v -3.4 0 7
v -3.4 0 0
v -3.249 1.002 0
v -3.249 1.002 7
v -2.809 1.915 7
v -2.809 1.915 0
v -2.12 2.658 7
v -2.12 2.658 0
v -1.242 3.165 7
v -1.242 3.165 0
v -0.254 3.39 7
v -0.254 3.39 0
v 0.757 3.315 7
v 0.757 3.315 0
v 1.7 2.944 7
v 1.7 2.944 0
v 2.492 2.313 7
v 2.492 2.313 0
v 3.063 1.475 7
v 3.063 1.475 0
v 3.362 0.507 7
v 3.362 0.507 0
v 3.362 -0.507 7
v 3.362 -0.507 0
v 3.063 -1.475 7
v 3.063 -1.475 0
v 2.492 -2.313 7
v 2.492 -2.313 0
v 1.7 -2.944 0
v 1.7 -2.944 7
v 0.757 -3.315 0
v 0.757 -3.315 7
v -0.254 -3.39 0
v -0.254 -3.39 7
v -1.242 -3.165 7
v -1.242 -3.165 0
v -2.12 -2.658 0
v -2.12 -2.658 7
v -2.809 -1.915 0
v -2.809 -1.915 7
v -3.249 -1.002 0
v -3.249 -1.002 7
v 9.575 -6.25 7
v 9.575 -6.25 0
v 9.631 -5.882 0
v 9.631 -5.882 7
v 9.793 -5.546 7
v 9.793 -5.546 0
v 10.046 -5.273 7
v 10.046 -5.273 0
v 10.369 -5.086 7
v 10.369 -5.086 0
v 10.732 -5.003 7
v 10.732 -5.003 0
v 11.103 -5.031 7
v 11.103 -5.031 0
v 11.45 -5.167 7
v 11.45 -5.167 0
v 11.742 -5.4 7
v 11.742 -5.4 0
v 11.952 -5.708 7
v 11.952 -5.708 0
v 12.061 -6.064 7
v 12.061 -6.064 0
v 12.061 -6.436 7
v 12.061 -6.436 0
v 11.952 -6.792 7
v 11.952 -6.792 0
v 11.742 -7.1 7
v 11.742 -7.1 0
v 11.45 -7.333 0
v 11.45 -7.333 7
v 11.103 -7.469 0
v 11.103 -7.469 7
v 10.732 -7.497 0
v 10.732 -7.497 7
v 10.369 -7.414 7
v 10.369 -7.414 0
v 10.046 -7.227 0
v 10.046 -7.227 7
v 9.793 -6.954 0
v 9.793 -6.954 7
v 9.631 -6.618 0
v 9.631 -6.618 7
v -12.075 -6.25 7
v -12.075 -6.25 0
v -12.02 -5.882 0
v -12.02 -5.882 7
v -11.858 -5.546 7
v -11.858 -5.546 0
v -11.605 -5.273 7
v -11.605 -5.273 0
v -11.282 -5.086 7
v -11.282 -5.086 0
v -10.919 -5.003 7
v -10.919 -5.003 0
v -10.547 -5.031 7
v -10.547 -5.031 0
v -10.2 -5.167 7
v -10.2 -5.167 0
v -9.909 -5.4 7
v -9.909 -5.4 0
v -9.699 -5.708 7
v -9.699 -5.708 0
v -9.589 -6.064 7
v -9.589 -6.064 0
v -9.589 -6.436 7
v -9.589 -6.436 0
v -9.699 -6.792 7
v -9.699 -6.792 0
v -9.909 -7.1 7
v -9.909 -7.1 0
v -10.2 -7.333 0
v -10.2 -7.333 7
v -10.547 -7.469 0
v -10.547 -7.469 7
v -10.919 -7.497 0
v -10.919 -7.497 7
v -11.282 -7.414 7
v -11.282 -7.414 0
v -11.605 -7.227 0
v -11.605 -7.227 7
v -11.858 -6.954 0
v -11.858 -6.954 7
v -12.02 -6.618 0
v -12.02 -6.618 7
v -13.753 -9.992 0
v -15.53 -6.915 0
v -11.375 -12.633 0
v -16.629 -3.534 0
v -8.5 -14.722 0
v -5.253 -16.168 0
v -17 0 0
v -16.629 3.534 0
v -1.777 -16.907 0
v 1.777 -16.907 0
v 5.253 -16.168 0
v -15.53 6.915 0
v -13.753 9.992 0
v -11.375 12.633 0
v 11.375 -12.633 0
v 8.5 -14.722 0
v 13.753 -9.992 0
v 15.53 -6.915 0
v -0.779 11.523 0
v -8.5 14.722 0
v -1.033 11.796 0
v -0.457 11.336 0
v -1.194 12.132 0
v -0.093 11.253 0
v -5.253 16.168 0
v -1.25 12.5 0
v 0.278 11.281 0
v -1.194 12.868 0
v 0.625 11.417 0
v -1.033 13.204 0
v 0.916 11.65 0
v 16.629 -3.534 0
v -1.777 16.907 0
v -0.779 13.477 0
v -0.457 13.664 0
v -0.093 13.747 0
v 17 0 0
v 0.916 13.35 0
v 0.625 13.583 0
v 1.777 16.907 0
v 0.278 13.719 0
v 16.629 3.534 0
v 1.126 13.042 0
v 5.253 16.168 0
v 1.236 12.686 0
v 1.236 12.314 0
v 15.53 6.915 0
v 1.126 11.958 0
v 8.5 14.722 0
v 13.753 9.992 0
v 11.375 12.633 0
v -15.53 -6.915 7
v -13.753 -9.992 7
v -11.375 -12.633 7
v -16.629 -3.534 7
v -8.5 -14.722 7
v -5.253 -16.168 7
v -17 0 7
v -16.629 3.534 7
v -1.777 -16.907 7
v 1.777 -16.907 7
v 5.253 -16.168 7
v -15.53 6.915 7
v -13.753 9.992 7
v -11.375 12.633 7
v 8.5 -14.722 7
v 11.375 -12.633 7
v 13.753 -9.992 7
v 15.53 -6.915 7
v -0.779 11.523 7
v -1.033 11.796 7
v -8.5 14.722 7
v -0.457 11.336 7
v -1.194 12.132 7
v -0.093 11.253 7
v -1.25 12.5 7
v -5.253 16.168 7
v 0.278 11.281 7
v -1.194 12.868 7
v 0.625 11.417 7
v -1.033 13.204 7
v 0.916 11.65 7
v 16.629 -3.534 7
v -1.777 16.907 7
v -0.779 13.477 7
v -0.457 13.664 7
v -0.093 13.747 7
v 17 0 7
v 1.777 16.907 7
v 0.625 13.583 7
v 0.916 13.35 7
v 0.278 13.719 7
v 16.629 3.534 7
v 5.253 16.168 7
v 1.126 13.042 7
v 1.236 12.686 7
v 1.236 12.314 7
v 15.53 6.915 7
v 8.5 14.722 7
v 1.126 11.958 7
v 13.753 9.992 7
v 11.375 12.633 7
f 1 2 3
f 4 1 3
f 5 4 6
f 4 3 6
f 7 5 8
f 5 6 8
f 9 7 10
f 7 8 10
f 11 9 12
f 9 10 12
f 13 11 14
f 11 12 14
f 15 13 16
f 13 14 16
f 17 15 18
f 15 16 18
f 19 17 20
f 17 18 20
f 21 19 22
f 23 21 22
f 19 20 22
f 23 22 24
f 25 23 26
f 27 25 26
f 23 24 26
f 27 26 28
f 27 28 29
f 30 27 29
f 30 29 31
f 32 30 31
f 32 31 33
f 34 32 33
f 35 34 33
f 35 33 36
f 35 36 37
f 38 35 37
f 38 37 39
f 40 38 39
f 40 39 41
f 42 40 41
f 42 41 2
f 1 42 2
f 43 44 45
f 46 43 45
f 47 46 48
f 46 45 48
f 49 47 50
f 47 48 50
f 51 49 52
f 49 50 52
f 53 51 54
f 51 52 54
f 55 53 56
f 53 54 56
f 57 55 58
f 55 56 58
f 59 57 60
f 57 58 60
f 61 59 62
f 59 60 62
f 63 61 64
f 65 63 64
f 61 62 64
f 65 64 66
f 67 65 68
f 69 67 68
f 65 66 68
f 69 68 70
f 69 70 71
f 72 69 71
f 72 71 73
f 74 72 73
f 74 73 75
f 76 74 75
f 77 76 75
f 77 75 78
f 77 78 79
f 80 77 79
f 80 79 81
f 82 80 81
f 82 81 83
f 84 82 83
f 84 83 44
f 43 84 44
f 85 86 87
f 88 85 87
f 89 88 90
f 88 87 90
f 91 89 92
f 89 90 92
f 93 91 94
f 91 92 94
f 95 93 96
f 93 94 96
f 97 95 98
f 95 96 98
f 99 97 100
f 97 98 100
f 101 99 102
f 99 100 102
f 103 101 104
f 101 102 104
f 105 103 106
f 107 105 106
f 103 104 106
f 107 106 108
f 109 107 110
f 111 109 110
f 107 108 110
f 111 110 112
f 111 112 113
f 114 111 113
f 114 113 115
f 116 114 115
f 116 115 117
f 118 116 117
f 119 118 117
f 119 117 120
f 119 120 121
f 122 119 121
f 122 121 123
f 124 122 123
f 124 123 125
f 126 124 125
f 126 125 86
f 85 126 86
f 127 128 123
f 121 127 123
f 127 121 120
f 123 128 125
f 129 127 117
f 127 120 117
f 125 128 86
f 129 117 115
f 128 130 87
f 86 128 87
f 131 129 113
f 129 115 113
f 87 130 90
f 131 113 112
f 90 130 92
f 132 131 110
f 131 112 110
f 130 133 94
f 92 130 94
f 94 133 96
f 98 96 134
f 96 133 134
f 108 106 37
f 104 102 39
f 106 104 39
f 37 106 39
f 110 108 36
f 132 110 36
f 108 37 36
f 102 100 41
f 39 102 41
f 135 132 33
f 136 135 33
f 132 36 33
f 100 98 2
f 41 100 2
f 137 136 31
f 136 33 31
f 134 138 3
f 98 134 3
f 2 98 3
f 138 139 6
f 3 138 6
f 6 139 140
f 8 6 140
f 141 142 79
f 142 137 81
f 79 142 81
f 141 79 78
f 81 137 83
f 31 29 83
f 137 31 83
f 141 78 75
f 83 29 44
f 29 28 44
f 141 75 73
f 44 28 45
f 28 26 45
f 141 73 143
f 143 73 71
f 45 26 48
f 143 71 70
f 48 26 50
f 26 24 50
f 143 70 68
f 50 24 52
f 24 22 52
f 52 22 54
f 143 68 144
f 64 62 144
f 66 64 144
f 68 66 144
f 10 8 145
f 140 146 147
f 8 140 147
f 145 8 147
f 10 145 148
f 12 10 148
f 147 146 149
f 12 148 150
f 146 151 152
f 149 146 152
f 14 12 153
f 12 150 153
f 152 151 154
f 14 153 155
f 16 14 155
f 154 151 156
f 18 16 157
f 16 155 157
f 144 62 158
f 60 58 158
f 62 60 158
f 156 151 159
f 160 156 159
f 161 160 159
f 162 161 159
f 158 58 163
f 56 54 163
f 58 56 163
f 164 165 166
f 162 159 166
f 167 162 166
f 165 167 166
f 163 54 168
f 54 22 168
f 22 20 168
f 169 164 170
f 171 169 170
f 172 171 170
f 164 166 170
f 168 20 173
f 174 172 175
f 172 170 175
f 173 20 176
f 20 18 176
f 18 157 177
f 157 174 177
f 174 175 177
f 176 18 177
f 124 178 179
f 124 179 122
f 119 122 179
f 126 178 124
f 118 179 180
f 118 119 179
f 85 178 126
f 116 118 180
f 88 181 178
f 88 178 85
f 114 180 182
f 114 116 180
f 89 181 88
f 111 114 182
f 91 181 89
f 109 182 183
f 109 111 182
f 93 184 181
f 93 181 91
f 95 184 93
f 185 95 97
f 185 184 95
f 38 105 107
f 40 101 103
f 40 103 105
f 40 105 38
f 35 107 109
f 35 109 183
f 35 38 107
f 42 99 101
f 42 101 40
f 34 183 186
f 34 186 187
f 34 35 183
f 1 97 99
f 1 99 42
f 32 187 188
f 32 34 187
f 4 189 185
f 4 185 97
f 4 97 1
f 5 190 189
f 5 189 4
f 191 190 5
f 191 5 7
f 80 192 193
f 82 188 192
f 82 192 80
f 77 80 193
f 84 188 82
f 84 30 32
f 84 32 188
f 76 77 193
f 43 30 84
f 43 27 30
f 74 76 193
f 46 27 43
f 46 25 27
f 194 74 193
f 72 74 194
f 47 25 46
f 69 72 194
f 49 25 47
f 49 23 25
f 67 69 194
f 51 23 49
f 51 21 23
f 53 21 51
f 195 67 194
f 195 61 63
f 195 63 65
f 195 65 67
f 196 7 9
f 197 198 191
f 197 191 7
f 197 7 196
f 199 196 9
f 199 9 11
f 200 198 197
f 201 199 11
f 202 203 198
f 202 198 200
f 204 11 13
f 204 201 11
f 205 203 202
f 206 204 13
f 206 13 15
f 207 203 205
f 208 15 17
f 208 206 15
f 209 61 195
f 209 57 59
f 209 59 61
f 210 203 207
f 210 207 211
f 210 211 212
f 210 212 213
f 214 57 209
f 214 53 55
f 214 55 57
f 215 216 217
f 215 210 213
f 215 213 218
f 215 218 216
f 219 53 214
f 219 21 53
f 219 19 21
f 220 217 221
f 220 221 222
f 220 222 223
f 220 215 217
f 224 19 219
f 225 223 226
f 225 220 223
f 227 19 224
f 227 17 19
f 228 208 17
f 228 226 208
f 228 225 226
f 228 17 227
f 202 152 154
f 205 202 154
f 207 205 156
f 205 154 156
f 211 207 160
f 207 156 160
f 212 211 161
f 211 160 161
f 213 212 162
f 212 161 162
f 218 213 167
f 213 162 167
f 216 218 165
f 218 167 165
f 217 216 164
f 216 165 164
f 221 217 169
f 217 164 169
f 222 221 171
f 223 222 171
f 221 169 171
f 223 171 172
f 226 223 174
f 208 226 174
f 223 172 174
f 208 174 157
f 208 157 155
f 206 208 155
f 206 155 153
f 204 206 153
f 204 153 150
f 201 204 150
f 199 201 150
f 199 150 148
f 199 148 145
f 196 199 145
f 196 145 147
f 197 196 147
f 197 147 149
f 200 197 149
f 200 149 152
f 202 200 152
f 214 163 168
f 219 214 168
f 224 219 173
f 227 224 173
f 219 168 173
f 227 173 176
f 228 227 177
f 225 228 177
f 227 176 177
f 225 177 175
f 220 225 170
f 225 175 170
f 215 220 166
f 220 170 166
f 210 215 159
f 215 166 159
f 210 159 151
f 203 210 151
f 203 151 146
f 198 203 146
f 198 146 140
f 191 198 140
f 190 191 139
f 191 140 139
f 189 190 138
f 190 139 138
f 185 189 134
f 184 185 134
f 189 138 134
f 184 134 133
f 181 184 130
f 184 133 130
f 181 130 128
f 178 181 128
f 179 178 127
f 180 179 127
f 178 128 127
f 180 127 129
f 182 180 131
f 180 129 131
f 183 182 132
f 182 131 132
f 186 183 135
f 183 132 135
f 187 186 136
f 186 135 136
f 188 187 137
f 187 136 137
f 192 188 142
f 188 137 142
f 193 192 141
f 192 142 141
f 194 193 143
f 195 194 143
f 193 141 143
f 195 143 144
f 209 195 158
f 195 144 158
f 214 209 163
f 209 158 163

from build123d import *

# Parameters (mm, degrees)
F0_R     = 17
F1_DEPTH = 7
F3_D     = 6.8
F4_D     = 2.5


with BuildPart() as f1:
    # F0 (on Top) → F1 (new body)
    with BuildSketch(Plane.XY):
        Circle(F0_R)
    extrude(amount=F1_DEPTH)

    # F3 (through all)
    with Locations(Plane.XY.offset(7)):
        with Locations((0, 0)):
            Hole(F3_D / 2)

    # F4 (through all)
    with Locations(Plane.XY.offset(7)):
        with Locations((0, 12.5), (10.8253175473, -6.25), (-10.8253175473, -6.25)):
            Hole(F4_D / 2)


solid = f1.part
